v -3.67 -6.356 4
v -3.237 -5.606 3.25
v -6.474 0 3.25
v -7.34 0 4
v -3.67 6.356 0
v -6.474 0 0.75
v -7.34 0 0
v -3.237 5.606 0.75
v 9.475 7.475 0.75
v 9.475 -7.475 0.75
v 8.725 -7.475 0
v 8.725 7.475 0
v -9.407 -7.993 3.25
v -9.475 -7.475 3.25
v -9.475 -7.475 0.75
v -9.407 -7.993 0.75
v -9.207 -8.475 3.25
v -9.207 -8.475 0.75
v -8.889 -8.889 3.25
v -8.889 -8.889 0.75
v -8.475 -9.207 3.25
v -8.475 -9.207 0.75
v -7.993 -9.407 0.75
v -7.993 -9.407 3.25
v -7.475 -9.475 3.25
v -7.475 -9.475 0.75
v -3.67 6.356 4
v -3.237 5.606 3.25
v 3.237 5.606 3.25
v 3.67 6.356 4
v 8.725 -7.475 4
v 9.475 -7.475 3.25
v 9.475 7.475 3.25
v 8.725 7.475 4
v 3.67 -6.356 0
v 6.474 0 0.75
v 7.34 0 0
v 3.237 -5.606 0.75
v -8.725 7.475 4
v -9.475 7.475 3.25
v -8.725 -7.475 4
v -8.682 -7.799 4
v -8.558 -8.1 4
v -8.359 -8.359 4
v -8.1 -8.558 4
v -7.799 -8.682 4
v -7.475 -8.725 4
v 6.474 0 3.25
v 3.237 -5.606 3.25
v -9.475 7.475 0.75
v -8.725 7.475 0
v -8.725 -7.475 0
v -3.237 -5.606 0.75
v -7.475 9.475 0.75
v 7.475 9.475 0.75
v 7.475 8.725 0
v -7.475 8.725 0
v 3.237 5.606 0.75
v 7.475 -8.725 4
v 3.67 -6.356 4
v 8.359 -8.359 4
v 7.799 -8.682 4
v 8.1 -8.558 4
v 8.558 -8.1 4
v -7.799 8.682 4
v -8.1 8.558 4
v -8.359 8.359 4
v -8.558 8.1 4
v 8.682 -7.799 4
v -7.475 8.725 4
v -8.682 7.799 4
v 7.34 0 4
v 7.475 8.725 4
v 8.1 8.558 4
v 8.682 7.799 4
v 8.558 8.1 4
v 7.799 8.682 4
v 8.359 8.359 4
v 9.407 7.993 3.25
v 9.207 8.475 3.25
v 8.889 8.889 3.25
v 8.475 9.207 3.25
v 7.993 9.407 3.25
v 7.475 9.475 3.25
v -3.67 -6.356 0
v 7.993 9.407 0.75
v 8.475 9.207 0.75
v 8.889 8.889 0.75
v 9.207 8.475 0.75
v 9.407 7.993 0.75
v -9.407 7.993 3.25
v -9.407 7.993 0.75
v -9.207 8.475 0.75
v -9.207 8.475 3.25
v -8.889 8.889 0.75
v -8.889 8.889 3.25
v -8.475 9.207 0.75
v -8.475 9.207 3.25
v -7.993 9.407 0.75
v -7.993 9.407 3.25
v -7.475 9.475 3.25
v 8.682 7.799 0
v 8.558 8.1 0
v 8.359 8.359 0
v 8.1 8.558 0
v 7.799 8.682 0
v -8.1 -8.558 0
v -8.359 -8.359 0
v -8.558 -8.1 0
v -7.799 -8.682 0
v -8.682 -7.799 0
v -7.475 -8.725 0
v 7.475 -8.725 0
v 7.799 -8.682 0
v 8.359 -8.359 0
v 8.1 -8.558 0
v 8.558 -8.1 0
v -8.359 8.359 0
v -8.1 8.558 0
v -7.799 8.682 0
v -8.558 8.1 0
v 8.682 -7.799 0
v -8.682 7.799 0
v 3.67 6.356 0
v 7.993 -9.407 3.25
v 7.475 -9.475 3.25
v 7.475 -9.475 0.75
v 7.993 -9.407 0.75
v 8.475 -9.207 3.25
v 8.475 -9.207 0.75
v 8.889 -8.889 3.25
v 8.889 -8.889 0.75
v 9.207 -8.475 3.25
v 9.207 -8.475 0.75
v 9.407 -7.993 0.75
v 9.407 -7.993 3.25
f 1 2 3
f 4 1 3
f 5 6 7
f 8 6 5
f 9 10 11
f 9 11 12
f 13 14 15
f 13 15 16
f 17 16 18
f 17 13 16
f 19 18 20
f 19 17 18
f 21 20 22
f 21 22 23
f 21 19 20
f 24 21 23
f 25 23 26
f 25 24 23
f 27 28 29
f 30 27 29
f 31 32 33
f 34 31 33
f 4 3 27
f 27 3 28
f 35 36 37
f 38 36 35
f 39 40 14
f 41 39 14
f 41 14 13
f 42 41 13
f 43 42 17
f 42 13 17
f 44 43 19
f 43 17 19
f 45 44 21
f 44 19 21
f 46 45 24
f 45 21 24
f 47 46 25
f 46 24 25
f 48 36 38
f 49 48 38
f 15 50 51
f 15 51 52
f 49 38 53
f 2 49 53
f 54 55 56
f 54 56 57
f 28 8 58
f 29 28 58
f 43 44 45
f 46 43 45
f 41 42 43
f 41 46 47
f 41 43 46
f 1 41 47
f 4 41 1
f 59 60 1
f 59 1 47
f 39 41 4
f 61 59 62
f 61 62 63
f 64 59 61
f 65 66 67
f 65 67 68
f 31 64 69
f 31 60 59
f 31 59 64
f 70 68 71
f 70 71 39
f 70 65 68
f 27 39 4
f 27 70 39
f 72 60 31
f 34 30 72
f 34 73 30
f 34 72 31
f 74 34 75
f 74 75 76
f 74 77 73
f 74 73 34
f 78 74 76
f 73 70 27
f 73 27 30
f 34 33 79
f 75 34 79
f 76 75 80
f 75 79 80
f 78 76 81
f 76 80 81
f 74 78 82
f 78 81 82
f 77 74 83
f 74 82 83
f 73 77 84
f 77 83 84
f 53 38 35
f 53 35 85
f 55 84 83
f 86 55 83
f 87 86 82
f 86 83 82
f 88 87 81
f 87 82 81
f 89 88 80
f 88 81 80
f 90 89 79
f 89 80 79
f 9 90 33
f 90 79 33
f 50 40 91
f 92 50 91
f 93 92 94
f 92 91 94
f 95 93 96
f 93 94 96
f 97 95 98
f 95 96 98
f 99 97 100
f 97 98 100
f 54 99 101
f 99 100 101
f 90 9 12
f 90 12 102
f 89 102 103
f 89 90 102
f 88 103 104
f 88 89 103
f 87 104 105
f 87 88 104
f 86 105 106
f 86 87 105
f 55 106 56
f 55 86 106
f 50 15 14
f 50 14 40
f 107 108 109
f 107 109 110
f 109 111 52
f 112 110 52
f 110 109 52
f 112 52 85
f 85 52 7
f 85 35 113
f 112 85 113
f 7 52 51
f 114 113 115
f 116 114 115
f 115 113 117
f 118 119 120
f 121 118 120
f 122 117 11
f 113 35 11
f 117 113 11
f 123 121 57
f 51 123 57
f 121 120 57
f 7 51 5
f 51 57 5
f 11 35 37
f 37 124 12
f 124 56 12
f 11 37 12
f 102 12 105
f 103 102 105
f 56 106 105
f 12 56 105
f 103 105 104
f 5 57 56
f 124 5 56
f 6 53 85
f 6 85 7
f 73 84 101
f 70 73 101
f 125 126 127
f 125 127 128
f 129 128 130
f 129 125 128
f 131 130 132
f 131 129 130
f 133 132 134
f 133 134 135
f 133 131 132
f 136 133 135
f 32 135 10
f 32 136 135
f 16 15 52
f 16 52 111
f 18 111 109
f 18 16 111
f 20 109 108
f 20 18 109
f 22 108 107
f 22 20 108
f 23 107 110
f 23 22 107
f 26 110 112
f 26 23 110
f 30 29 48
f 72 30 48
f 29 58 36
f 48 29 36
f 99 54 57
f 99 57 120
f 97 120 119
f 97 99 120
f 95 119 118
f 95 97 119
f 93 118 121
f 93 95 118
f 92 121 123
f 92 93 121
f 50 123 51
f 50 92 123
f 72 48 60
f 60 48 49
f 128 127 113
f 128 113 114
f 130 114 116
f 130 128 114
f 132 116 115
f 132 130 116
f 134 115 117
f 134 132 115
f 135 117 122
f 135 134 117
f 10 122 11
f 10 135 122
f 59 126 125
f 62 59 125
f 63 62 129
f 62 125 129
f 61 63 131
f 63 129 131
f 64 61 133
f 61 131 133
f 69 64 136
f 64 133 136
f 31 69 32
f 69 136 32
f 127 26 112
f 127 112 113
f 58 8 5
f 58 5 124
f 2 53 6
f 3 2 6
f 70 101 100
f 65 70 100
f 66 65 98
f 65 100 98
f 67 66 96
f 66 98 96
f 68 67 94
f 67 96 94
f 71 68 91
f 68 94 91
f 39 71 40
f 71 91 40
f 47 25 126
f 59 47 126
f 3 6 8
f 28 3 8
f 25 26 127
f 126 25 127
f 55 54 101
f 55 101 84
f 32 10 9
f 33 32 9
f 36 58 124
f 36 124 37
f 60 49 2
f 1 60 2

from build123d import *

# Parameters (mm, degrees)
F0_W     = 18.95
F0_H     = 18.95
F1_DEPTH = 4
F2_R     = 2
F3_SIZE  = 0.75


with BuildPart() as f1:
    # F0 (on Top) → F1 (new body)
    with BuildSketch(Plane.XY):
        Rectangle(F0_W, F0_H)
        Polygon((-6.47354, 0), (-3.23677, 5.60625), (3.23677, 5.60625), (6.47354, 0), (3.23677, -5.60625), (-3.23677, -5.60625), align=None, mode=Mode.SUBTRACT)
    extrude(amount=F1_DEPTH)

    # F2
    f2_edges = [f1.edges().sort_by_distance(p)[0] for p in [
        (9.475, -9.475, 2),
        (9.475, 9.475, 2),
        (-9.475, -9.475, 2),
        (-9.475, 9.475, 2),
    ]]
    fillet(f2_edges, radius=F2_R)

    # F3
    f3_edges = [f1.edges().sort_by_distance(p)[0] for p in [
        (9.475, 0, 4),
        (8.889214, -8.889214, 4),
        (8.889214, 8.889214, 4),
        (0, -9.475, 4),
        (0, 9.475, 4),
        (-8.889214, -8.889214, 4),
        (-8.889214, 8.889214, 4),
        (-9.475, 0, 4),
        (-4.855155, 2.803125, 4),
        (0, 5.60625, 4),
        (4.855155, 2.803125, 4),
        (4.855155, -2.803125, 4),
        (0, -5.60625, 4),
        (-4.855155, -2.803125, 4),
        (9.475, 0, 0),
        (8.889214, -8.889214, 0),
        (8.889214, 8.889214, 0),
        (0, -9.475, 0),
        (0, 9.475, 0),
        (-8.889214, -8.889214, 0),
        (-8.889214, 8.889214, 0),
        (-9.475, 0, 0),
        (-4.855155, 2.803125, 0),
        (0, 5.60625, 0),
        (4.855155, 2.803125, 0),
        (4.855155, -2.803125, 0),
        (0, -5.60625, 0),
        (-4.855155, -2.803125, 0),
    ]]
    chamfer(f3_edges, length=F3_SIZE)


solid = f1.part
